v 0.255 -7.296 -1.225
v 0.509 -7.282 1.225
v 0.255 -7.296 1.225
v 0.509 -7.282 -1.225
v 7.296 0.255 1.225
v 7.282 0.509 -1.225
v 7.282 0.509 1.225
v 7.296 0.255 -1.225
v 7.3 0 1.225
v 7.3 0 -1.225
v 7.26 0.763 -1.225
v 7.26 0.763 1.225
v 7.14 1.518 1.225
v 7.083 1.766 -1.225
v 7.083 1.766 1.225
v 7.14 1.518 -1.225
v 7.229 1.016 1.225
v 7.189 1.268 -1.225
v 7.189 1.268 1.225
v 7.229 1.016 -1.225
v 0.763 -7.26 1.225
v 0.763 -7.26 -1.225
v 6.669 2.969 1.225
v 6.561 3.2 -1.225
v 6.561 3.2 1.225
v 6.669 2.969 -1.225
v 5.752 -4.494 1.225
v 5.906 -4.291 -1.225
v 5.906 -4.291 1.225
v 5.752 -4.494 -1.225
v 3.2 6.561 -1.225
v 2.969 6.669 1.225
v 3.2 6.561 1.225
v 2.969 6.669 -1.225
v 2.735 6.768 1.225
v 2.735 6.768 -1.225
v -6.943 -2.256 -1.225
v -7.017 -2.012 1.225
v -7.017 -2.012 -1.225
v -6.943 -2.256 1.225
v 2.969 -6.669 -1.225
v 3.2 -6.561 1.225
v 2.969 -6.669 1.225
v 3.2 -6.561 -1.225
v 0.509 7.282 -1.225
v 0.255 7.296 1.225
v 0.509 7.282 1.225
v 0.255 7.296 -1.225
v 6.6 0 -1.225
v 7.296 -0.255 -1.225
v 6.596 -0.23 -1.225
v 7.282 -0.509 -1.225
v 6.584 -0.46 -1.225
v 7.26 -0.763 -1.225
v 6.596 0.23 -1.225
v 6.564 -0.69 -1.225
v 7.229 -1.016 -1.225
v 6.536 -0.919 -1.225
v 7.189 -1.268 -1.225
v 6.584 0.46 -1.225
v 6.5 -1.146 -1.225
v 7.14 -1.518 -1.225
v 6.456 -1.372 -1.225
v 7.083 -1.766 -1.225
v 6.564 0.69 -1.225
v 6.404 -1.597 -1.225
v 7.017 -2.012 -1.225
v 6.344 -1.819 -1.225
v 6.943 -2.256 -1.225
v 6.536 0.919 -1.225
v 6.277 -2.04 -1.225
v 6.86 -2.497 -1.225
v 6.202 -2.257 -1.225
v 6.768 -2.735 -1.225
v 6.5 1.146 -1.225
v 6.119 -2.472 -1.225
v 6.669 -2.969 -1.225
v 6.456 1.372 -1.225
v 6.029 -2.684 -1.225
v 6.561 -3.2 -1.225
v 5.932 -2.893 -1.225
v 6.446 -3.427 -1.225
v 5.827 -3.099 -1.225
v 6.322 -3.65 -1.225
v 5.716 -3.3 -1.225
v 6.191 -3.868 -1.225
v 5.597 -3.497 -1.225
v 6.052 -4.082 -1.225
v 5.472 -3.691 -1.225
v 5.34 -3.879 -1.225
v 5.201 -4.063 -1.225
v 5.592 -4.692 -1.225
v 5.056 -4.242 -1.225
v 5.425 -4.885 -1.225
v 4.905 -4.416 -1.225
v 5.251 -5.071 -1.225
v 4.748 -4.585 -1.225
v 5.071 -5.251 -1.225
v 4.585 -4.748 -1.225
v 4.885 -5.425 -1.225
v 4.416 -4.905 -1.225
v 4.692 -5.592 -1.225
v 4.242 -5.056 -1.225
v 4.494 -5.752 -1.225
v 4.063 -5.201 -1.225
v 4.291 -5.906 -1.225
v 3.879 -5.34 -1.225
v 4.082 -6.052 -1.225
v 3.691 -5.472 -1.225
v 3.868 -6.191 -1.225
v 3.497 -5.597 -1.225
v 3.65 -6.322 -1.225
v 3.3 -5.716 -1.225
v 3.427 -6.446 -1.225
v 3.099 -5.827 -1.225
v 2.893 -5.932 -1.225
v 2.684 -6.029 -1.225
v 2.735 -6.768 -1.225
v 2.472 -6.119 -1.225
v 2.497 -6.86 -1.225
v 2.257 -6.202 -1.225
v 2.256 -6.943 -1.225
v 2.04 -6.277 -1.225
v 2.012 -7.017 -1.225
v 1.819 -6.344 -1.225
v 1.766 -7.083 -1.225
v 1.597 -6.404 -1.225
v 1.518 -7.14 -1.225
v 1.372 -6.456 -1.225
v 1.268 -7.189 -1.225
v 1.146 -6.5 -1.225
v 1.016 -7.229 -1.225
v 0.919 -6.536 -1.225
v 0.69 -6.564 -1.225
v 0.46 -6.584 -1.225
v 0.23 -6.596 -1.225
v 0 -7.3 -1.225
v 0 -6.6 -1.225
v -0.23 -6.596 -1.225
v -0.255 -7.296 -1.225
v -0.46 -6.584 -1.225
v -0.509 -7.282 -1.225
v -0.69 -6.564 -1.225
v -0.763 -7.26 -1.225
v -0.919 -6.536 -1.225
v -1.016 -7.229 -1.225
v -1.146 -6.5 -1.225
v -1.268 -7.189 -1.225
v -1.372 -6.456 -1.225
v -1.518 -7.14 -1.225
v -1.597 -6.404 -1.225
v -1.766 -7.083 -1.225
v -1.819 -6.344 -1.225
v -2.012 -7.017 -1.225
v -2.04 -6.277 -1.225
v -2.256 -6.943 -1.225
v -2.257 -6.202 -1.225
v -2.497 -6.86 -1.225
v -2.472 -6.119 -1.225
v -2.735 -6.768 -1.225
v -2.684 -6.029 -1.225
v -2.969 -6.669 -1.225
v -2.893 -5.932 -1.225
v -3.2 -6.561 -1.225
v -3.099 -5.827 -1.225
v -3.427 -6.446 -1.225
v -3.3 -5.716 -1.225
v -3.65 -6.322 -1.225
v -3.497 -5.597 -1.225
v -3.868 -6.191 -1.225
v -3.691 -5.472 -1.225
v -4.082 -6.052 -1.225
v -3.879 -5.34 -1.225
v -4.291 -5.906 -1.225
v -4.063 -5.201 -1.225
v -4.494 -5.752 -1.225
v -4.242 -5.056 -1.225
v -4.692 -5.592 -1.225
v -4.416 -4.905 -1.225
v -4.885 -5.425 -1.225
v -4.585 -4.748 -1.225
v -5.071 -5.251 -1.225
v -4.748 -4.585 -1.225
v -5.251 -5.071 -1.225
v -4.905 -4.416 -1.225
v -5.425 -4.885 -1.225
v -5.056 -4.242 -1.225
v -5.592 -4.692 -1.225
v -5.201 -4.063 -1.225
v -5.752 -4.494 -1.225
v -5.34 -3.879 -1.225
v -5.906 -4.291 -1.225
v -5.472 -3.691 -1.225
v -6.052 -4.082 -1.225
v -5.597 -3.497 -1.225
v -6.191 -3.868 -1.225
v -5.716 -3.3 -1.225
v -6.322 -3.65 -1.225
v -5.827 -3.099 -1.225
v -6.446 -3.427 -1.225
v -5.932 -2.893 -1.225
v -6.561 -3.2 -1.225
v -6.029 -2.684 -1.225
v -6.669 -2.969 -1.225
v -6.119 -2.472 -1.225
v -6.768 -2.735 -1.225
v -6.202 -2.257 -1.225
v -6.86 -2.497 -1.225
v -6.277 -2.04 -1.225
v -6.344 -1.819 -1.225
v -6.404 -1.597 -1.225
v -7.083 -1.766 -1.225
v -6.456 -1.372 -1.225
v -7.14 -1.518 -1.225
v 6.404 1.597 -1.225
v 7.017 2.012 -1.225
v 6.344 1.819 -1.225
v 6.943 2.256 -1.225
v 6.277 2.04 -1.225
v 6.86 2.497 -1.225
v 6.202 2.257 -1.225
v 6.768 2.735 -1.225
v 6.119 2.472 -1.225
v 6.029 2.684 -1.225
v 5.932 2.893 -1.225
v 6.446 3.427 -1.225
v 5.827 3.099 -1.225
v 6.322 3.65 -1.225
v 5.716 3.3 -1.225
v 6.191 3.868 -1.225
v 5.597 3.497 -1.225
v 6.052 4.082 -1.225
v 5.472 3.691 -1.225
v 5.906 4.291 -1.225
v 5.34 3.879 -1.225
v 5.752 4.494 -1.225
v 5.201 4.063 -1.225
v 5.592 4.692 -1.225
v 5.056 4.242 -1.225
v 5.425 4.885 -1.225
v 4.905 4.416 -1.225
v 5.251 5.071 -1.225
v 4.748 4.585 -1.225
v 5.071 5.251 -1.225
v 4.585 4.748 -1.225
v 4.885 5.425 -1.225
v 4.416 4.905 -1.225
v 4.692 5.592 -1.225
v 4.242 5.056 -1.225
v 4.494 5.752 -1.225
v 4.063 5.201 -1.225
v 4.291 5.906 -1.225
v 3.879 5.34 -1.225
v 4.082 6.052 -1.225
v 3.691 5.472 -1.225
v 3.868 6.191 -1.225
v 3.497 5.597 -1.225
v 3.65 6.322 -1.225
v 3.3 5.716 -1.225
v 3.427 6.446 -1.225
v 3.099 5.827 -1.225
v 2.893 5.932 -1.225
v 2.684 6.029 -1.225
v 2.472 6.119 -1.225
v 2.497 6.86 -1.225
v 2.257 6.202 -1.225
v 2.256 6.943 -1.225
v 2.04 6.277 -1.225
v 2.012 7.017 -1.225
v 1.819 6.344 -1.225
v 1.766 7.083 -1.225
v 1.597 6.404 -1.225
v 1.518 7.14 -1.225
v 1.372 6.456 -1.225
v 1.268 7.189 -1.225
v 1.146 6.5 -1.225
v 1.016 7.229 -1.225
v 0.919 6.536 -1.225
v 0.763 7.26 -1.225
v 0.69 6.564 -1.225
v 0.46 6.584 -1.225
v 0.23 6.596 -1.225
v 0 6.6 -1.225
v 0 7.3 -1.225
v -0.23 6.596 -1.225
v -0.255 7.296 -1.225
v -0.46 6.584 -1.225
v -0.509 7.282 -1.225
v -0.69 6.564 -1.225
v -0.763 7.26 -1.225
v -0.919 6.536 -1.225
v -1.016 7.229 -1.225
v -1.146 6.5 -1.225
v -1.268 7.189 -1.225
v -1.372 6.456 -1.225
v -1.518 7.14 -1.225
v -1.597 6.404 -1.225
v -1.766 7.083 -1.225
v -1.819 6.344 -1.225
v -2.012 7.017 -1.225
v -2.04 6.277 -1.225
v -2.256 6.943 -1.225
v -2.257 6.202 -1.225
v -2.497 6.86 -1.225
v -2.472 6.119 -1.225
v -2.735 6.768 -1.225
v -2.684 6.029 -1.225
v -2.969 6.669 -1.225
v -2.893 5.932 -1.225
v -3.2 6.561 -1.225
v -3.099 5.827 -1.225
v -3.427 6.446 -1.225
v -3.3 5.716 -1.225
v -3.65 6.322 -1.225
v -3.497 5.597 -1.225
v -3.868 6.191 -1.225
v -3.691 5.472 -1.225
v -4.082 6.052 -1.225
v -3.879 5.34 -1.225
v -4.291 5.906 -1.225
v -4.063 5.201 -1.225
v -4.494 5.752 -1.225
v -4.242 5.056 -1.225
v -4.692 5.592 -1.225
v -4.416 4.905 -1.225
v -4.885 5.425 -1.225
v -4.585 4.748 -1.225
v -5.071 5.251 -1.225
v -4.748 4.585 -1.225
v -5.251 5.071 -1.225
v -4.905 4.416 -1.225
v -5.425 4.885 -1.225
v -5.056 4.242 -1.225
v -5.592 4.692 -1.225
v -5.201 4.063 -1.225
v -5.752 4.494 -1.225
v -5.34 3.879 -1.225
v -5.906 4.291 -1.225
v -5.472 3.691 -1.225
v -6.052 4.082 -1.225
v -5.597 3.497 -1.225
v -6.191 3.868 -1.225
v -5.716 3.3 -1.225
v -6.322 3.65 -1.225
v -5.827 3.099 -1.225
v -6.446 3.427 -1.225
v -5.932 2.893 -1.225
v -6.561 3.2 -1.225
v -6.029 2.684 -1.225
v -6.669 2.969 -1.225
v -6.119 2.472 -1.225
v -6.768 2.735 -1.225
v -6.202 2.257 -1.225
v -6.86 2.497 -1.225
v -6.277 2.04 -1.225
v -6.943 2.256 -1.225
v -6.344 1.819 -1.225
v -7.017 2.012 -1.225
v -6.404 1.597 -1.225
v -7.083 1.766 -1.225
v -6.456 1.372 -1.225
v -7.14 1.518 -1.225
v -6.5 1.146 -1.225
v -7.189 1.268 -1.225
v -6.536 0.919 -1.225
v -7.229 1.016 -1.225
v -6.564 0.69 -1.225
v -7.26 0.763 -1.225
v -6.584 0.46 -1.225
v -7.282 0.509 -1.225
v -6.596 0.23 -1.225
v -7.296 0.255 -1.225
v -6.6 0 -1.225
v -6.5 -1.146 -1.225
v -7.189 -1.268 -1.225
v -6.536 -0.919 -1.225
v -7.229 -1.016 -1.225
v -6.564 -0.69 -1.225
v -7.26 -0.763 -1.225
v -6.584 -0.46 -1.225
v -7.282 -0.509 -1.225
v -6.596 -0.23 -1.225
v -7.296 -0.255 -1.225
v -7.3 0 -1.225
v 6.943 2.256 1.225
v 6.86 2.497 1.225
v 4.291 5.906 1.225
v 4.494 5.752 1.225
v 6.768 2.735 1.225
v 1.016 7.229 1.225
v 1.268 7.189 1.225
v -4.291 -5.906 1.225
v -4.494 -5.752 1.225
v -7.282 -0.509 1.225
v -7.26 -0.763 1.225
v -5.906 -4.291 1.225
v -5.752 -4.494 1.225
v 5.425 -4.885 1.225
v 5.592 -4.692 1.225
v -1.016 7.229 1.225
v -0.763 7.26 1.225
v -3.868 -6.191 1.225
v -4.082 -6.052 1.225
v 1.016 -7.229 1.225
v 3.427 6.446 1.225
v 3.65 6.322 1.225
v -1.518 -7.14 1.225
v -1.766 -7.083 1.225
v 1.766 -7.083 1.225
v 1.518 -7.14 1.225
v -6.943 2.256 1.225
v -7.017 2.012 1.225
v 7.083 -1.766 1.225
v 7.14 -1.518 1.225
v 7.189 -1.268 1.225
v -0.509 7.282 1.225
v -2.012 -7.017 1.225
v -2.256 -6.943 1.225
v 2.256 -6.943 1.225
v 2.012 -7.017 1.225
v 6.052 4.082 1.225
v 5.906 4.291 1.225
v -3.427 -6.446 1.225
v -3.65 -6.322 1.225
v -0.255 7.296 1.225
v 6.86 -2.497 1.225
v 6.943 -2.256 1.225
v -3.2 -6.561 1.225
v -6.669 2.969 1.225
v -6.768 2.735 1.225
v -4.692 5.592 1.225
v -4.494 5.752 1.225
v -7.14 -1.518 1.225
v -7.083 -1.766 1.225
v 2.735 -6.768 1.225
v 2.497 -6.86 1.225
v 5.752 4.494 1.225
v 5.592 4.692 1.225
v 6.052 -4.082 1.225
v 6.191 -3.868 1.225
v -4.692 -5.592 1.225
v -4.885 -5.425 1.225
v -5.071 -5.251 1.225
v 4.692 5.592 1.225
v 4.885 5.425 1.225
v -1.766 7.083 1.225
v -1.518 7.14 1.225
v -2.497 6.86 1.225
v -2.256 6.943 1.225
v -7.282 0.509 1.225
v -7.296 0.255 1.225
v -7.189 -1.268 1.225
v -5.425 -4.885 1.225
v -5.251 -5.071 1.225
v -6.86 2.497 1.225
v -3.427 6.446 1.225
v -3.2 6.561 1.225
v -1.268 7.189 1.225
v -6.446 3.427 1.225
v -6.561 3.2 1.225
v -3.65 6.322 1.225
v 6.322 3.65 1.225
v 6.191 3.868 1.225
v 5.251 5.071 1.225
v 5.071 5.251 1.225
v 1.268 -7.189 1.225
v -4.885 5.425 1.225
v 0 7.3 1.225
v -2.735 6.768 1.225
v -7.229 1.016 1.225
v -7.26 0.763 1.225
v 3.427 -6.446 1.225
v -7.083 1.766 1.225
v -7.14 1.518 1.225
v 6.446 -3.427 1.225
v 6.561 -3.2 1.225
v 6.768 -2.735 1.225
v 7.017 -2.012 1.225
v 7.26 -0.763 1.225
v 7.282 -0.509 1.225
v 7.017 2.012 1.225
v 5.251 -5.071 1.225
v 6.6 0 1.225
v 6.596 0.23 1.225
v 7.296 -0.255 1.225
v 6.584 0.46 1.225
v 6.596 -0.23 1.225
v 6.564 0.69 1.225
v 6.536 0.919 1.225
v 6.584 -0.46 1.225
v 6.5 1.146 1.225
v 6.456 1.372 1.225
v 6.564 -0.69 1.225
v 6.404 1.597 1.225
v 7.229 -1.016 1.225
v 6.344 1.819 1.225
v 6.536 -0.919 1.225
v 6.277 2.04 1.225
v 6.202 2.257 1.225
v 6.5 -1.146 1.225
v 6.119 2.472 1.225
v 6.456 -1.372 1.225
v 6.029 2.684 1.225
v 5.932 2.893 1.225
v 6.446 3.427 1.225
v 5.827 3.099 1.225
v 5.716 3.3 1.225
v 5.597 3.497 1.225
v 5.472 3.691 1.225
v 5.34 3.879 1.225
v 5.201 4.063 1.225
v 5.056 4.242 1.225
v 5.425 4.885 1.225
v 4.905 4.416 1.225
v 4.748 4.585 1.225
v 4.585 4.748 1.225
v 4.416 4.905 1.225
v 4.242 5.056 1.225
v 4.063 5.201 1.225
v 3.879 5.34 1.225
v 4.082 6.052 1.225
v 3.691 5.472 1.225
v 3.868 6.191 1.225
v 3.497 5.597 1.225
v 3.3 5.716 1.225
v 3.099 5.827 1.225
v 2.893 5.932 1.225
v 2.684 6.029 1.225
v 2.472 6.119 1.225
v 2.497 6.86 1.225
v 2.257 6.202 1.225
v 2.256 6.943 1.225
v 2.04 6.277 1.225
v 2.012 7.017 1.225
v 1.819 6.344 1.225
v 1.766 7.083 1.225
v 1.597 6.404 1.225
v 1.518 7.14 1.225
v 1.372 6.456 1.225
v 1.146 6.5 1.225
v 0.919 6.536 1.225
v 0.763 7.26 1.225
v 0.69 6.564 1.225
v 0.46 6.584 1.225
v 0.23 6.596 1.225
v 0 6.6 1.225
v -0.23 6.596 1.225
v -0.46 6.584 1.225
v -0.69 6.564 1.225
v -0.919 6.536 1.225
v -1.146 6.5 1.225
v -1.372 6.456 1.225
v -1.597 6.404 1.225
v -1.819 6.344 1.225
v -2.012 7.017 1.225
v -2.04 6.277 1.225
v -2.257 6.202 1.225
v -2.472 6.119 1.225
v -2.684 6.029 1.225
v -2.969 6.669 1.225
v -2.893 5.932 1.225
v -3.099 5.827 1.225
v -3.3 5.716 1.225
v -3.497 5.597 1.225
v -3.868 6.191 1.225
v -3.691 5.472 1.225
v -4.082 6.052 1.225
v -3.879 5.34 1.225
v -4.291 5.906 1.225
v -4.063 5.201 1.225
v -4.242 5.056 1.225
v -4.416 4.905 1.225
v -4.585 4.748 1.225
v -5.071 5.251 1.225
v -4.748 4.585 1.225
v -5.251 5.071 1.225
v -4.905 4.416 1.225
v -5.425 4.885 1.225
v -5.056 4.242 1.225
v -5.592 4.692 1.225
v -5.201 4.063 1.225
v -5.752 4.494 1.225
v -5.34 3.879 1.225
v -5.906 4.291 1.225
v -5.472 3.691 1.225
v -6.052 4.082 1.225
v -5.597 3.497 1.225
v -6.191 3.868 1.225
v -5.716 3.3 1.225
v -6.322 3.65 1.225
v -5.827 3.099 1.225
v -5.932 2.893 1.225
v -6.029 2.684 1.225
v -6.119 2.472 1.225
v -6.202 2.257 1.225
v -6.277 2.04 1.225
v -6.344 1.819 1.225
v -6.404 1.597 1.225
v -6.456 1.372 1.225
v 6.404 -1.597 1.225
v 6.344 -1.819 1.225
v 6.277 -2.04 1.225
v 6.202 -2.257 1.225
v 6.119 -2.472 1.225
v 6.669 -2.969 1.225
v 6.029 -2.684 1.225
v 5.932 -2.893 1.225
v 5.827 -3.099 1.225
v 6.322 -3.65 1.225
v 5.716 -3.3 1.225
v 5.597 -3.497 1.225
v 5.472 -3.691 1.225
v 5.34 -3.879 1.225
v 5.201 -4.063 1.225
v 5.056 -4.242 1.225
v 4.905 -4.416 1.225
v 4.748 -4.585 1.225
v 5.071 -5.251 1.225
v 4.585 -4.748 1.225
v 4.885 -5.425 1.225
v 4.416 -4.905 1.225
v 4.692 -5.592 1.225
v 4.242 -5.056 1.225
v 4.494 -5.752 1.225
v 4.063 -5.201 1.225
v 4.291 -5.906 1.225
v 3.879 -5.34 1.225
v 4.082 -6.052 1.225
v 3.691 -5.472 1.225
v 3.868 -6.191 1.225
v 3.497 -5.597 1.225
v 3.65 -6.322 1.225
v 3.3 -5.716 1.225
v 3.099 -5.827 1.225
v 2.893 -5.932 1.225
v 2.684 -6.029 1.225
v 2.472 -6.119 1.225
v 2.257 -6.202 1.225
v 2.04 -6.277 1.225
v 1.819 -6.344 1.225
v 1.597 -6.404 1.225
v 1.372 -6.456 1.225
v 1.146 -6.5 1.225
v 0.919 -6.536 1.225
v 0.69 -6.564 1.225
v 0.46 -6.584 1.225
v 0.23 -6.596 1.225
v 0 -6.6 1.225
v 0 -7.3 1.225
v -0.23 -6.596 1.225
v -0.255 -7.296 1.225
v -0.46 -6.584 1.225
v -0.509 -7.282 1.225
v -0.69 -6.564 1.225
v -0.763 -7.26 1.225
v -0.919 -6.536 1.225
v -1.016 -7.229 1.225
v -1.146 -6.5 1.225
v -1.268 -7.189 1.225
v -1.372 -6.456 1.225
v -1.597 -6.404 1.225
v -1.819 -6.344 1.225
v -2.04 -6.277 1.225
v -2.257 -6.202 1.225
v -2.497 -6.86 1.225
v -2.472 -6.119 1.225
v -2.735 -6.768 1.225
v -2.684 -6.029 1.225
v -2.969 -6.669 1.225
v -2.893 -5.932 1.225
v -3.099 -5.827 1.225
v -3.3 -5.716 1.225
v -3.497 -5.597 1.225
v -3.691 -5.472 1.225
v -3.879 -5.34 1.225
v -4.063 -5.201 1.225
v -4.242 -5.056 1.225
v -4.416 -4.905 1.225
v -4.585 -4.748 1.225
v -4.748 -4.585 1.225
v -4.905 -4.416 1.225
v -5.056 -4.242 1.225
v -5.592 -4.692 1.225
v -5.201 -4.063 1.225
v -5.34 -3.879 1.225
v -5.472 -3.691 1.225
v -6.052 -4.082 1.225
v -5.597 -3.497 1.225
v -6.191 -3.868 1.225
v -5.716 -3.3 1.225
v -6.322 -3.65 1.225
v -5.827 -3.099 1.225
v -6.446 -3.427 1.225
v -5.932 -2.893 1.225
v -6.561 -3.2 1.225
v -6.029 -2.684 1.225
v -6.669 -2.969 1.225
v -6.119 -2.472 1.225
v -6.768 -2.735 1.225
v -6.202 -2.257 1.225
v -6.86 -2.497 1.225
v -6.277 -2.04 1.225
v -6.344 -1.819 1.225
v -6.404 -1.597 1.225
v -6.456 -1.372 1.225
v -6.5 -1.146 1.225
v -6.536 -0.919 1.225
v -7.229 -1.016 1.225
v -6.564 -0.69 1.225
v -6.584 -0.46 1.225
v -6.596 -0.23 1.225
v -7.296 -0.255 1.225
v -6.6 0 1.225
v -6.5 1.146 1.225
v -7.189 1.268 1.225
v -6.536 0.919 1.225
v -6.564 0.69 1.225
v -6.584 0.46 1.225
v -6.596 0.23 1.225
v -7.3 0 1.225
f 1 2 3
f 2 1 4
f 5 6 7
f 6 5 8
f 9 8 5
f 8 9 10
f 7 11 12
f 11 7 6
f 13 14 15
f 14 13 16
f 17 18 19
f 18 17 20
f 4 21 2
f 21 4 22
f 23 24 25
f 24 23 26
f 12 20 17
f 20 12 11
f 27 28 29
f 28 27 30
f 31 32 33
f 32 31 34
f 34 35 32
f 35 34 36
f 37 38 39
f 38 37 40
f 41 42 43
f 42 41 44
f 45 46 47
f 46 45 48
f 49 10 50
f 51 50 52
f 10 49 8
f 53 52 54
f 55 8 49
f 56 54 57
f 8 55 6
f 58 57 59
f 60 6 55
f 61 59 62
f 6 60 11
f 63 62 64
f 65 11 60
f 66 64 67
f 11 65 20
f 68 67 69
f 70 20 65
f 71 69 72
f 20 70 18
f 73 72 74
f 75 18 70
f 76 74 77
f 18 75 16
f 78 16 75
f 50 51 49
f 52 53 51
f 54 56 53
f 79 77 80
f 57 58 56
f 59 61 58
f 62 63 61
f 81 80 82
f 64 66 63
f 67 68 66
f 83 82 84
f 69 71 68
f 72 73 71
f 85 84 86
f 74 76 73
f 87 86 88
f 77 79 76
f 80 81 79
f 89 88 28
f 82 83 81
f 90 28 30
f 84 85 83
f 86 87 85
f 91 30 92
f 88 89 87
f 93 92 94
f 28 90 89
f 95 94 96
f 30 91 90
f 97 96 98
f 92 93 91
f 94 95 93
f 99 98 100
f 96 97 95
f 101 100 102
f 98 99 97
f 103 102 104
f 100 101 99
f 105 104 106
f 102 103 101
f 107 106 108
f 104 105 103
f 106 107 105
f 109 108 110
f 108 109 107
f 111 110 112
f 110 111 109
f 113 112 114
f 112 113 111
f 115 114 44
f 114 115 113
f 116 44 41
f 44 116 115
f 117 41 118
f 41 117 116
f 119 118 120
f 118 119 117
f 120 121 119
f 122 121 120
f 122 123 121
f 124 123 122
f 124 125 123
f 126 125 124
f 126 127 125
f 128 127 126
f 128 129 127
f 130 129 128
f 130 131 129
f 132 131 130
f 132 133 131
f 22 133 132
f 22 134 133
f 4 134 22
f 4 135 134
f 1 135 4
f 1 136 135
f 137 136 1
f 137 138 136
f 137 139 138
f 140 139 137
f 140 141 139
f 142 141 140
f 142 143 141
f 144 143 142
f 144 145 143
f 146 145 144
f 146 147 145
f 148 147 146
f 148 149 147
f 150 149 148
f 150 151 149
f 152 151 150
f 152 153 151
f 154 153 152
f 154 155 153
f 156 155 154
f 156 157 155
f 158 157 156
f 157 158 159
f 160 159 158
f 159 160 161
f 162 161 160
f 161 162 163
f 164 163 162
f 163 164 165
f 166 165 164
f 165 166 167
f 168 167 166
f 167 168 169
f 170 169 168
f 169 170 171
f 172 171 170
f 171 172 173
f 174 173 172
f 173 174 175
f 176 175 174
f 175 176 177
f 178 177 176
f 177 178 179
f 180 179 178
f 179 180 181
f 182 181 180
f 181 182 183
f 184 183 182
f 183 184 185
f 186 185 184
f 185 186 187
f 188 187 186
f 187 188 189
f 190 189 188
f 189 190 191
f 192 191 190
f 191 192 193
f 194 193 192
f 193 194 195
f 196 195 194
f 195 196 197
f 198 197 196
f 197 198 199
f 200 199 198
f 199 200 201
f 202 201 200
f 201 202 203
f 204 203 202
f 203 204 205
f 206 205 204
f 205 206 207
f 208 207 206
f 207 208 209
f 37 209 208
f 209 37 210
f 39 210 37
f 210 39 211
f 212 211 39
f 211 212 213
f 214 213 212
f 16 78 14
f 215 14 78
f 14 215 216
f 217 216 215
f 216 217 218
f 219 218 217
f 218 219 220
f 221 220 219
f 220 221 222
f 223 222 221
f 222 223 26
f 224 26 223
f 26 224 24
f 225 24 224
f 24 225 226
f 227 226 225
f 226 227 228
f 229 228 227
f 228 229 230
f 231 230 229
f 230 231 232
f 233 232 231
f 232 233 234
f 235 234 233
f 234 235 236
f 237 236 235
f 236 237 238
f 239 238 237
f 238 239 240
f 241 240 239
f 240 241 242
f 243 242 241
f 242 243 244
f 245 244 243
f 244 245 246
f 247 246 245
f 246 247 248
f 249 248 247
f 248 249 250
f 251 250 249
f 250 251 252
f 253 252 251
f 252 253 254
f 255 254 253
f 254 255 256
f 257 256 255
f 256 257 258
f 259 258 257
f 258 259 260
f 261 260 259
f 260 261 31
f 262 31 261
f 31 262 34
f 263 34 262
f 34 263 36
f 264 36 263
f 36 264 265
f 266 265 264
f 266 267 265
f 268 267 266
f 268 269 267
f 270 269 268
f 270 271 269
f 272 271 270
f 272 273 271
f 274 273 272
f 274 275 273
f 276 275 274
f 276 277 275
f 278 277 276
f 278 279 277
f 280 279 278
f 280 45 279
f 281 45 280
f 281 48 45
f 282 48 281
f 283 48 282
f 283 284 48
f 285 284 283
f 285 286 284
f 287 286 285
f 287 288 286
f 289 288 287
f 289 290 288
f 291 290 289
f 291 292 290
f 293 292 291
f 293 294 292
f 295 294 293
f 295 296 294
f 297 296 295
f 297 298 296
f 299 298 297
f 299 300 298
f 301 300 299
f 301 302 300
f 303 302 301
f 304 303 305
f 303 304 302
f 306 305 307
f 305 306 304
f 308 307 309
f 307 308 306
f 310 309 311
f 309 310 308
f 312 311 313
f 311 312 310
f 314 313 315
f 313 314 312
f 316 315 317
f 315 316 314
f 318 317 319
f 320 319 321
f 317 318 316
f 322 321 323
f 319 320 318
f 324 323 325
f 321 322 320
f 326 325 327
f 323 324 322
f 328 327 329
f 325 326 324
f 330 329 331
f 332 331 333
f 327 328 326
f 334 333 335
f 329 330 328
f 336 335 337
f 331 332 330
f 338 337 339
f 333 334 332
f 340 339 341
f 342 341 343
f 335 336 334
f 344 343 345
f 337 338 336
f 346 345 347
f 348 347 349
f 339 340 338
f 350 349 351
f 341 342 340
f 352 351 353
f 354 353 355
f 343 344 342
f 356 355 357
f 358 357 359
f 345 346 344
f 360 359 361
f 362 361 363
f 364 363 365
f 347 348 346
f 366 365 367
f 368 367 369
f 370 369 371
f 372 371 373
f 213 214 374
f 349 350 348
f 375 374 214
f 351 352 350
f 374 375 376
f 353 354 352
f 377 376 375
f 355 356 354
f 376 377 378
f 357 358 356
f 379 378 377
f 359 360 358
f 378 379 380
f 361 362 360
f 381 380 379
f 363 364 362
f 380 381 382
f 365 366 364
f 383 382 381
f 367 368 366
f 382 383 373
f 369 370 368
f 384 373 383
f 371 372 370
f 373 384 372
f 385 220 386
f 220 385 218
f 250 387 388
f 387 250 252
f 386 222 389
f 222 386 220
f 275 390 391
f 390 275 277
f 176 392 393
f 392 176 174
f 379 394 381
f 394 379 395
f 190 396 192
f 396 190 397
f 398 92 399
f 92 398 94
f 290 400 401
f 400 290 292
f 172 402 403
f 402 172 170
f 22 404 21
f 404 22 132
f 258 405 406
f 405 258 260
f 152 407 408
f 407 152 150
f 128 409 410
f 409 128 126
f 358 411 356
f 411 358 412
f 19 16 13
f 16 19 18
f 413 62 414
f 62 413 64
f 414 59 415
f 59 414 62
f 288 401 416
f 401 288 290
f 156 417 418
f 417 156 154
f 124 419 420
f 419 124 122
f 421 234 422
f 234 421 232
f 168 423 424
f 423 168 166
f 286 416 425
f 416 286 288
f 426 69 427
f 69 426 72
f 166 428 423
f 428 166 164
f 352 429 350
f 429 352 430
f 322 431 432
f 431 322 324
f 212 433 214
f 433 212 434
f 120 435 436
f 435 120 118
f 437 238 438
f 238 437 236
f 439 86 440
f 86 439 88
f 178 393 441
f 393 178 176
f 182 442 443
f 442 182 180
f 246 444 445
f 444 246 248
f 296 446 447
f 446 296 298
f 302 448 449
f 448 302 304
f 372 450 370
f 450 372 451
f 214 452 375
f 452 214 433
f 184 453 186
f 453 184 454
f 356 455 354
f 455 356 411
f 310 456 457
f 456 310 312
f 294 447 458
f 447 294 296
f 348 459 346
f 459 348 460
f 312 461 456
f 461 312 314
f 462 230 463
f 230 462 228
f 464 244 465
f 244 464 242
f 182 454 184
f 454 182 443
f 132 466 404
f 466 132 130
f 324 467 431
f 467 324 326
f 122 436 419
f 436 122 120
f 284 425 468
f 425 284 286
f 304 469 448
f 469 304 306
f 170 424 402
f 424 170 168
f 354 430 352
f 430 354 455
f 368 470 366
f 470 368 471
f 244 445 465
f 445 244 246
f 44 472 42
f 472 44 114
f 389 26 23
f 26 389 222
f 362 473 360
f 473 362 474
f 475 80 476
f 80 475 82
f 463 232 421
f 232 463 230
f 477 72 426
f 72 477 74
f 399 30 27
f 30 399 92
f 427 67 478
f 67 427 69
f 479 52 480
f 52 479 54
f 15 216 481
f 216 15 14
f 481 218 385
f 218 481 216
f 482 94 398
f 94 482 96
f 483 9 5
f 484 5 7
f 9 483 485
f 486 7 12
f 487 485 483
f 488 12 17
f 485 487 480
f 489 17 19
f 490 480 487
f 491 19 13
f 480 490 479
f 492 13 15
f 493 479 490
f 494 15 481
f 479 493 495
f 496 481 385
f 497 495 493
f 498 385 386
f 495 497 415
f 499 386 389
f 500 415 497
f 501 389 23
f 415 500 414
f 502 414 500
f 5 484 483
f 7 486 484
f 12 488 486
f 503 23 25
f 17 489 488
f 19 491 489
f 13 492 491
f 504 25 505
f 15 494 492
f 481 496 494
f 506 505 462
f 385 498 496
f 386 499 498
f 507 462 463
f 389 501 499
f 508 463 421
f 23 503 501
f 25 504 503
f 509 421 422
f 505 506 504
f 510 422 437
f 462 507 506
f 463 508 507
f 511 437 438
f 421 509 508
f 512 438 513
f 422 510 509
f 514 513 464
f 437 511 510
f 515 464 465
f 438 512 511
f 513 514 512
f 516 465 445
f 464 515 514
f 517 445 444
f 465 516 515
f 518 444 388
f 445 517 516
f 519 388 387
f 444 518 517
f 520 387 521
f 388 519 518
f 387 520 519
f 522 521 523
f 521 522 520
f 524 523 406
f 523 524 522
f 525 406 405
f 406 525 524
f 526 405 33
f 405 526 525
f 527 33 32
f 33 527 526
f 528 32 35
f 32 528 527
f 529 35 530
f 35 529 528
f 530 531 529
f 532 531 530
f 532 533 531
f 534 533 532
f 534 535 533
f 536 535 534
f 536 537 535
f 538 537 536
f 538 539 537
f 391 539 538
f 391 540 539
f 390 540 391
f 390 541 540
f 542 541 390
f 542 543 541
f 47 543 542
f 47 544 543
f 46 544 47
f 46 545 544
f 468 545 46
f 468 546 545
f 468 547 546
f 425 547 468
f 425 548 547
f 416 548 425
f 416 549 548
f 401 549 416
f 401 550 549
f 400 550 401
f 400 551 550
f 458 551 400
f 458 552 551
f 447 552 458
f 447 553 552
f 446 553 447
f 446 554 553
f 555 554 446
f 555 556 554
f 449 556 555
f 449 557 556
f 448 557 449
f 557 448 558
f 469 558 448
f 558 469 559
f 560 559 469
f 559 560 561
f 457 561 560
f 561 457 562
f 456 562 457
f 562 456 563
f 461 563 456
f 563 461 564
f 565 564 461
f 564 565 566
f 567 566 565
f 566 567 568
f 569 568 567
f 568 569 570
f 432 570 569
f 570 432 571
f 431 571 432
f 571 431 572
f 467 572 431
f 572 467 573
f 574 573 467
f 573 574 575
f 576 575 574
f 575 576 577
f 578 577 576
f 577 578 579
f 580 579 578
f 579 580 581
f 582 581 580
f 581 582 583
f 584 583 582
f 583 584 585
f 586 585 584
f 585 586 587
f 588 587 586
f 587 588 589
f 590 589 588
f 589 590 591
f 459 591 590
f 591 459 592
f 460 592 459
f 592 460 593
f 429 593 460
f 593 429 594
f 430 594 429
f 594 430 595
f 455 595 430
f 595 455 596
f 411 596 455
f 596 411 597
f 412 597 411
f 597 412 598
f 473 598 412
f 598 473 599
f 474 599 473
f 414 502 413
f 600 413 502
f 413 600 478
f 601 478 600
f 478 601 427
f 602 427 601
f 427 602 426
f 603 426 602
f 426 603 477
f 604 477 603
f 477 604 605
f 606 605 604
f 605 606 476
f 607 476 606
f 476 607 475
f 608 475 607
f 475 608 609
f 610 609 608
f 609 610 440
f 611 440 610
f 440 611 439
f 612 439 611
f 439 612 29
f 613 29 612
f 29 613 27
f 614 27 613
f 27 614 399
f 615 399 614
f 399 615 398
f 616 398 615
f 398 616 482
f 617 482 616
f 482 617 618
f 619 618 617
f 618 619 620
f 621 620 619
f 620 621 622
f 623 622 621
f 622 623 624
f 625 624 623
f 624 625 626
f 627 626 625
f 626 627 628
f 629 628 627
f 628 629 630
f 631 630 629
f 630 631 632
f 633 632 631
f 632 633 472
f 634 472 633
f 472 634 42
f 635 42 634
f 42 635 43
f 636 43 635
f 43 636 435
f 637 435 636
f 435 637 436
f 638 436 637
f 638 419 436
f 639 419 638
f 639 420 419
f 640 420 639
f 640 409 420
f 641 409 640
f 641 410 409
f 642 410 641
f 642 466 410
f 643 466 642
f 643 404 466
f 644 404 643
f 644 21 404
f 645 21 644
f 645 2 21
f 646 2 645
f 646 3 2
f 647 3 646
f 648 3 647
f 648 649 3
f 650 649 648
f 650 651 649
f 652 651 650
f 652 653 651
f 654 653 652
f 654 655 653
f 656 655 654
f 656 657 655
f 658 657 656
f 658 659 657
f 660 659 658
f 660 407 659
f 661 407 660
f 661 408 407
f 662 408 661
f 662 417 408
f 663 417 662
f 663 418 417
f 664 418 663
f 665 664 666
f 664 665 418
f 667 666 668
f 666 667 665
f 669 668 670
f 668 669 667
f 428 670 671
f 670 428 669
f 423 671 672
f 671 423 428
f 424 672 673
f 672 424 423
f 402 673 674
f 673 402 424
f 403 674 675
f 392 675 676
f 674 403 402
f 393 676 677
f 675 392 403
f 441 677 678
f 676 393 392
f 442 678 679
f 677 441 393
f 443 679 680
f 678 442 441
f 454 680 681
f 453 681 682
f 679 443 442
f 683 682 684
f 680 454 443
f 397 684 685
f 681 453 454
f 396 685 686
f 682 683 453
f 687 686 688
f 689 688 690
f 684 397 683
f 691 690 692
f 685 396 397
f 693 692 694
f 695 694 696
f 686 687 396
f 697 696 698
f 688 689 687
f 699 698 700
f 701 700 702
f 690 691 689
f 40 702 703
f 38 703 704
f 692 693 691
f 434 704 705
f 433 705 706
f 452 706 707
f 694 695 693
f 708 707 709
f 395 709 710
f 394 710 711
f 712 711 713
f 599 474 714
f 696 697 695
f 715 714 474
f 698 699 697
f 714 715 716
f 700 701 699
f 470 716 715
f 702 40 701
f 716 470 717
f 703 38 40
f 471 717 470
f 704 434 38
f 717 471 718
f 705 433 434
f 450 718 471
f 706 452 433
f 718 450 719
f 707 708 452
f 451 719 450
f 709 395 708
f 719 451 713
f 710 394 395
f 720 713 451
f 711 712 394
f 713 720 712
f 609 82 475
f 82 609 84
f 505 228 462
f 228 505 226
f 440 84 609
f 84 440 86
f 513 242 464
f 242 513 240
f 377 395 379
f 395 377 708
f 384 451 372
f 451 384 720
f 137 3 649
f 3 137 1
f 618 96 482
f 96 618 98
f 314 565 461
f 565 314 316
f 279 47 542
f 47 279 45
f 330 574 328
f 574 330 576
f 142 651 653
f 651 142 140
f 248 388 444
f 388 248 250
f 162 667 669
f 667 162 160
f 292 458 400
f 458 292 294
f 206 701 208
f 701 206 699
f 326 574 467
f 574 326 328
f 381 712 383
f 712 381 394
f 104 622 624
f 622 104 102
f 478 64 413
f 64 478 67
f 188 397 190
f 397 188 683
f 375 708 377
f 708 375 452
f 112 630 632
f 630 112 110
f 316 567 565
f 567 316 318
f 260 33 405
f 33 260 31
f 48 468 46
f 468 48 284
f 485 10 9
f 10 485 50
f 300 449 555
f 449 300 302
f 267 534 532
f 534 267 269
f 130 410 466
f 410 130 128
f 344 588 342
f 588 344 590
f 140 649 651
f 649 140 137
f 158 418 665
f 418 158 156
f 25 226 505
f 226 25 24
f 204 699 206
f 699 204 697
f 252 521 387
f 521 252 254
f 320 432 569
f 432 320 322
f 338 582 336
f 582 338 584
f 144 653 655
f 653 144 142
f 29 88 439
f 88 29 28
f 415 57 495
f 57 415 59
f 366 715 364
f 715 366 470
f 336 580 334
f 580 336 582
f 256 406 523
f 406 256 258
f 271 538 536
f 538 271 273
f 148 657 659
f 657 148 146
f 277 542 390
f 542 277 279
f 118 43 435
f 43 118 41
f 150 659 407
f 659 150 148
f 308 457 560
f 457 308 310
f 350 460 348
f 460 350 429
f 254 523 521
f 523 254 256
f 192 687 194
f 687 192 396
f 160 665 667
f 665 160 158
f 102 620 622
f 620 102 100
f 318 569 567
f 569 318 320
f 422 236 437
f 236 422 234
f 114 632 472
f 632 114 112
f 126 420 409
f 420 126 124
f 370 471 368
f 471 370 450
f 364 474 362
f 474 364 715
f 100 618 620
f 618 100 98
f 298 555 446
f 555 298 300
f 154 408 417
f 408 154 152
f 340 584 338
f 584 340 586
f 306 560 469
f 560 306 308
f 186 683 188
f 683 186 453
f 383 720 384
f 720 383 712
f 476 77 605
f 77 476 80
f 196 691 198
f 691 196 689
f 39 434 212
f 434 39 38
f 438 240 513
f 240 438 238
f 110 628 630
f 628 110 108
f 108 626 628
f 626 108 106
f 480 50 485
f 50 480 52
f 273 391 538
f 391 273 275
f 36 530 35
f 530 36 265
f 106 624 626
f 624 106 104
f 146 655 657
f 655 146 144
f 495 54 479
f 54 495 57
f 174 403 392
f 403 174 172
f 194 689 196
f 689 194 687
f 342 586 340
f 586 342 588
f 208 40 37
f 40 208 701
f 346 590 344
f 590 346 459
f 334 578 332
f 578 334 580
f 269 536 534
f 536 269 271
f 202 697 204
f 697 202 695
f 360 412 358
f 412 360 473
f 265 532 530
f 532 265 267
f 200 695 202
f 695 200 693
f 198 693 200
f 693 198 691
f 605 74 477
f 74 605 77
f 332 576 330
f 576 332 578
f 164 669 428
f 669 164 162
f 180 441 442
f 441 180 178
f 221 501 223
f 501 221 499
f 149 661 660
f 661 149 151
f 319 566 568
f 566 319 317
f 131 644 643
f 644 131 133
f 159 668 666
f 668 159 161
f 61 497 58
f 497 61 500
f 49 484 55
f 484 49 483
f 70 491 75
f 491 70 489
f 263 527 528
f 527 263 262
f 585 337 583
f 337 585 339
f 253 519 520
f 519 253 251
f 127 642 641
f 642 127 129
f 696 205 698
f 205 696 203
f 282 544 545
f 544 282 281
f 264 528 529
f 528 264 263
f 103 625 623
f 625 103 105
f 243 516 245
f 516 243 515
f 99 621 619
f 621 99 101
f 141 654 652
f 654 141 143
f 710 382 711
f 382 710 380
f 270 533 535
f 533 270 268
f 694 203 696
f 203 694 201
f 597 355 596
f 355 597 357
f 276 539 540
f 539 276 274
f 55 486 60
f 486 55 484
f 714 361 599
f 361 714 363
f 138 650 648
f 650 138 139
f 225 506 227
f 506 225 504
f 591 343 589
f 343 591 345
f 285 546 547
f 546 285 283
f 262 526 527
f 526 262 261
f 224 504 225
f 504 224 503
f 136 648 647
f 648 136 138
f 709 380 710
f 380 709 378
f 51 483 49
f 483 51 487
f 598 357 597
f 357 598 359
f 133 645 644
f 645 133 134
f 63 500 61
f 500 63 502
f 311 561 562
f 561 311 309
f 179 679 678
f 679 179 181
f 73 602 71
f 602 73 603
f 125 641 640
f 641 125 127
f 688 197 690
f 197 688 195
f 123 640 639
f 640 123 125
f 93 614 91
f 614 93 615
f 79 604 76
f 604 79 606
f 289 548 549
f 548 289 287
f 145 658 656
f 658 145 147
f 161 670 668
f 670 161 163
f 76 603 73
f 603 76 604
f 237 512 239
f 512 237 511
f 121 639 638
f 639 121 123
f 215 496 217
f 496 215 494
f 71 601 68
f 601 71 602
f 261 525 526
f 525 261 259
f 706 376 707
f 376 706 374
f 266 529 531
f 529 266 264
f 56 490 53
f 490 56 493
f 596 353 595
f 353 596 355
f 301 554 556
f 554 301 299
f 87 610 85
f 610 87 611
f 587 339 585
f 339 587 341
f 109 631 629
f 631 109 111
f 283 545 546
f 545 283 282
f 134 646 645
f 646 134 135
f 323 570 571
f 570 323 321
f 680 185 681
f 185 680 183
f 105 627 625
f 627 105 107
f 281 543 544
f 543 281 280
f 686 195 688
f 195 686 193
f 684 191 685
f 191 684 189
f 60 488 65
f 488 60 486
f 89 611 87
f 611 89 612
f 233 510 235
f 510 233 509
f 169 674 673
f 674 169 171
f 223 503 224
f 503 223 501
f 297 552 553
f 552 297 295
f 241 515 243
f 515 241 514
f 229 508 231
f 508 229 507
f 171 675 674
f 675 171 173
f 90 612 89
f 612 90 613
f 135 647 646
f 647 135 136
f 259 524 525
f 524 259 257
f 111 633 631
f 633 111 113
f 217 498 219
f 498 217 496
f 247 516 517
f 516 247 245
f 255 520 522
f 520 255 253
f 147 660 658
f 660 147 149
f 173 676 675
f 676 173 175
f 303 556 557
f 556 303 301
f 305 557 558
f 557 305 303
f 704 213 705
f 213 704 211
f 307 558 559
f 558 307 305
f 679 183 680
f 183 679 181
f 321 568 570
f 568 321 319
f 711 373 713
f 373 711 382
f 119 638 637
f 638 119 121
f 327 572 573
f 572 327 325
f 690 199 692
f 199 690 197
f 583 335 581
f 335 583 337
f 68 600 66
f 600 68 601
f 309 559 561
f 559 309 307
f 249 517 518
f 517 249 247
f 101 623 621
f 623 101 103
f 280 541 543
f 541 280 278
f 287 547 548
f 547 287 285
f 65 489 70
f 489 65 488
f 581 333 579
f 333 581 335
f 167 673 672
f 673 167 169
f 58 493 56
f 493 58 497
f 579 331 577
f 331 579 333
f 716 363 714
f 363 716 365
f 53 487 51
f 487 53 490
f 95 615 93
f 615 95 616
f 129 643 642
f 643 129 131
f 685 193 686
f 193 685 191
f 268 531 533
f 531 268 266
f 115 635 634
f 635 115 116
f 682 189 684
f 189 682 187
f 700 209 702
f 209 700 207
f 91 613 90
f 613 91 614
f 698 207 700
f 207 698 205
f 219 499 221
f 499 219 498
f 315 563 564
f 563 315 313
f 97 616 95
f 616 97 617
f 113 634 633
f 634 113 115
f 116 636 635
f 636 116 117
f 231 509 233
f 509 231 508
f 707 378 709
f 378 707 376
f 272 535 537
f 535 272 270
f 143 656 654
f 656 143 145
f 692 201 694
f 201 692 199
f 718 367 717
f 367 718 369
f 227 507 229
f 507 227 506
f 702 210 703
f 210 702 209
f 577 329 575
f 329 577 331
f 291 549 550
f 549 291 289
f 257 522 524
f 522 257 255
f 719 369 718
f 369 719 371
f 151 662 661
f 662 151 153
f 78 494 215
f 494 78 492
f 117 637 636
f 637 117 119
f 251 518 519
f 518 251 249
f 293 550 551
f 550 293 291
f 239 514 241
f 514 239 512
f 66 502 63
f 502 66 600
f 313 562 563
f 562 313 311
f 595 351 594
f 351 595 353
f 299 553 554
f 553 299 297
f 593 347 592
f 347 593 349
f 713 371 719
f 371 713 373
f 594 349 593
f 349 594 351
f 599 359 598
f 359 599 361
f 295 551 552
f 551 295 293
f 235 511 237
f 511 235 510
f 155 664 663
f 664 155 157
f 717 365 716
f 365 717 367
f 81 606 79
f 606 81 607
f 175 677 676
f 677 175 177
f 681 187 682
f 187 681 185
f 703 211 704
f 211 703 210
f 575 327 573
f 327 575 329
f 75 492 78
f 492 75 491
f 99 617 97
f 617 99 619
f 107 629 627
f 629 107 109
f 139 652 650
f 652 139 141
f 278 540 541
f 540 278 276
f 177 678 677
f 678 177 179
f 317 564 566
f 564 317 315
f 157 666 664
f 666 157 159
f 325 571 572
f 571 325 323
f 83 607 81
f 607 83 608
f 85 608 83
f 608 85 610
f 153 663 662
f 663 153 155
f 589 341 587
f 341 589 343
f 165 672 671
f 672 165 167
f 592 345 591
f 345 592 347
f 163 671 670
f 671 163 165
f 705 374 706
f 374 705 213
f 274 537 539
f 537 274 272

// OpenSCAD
// R = 6.85; T = 0.5; H = 2.35; // Martin's room. Just cut through, do not cut out anything. Clicks.
// R = 6.85; T = 0.5; H = 2.35; // Bedroom left. Just cut through, do not cut out anything. Friction only.
//R = 7.20; T = 0.5; H = 2.45; // Living room left. Just cut through, do not cut out anything.
R = 7.30; T = 0.7; H = 2.45; // Experiment with oversize for better click-locking. Living room right. Just cut through, do not cut out anything.


difference() {
    union() {
        cylinder(r=R, h=H, $fn=180, center=true);
    }
    union() {
        cylinder(r=R - T, h=H, $fn=180, center=true);
        //translate([-6, 0, 0]) cube([4, 4, 4], center=true);
    }
}
